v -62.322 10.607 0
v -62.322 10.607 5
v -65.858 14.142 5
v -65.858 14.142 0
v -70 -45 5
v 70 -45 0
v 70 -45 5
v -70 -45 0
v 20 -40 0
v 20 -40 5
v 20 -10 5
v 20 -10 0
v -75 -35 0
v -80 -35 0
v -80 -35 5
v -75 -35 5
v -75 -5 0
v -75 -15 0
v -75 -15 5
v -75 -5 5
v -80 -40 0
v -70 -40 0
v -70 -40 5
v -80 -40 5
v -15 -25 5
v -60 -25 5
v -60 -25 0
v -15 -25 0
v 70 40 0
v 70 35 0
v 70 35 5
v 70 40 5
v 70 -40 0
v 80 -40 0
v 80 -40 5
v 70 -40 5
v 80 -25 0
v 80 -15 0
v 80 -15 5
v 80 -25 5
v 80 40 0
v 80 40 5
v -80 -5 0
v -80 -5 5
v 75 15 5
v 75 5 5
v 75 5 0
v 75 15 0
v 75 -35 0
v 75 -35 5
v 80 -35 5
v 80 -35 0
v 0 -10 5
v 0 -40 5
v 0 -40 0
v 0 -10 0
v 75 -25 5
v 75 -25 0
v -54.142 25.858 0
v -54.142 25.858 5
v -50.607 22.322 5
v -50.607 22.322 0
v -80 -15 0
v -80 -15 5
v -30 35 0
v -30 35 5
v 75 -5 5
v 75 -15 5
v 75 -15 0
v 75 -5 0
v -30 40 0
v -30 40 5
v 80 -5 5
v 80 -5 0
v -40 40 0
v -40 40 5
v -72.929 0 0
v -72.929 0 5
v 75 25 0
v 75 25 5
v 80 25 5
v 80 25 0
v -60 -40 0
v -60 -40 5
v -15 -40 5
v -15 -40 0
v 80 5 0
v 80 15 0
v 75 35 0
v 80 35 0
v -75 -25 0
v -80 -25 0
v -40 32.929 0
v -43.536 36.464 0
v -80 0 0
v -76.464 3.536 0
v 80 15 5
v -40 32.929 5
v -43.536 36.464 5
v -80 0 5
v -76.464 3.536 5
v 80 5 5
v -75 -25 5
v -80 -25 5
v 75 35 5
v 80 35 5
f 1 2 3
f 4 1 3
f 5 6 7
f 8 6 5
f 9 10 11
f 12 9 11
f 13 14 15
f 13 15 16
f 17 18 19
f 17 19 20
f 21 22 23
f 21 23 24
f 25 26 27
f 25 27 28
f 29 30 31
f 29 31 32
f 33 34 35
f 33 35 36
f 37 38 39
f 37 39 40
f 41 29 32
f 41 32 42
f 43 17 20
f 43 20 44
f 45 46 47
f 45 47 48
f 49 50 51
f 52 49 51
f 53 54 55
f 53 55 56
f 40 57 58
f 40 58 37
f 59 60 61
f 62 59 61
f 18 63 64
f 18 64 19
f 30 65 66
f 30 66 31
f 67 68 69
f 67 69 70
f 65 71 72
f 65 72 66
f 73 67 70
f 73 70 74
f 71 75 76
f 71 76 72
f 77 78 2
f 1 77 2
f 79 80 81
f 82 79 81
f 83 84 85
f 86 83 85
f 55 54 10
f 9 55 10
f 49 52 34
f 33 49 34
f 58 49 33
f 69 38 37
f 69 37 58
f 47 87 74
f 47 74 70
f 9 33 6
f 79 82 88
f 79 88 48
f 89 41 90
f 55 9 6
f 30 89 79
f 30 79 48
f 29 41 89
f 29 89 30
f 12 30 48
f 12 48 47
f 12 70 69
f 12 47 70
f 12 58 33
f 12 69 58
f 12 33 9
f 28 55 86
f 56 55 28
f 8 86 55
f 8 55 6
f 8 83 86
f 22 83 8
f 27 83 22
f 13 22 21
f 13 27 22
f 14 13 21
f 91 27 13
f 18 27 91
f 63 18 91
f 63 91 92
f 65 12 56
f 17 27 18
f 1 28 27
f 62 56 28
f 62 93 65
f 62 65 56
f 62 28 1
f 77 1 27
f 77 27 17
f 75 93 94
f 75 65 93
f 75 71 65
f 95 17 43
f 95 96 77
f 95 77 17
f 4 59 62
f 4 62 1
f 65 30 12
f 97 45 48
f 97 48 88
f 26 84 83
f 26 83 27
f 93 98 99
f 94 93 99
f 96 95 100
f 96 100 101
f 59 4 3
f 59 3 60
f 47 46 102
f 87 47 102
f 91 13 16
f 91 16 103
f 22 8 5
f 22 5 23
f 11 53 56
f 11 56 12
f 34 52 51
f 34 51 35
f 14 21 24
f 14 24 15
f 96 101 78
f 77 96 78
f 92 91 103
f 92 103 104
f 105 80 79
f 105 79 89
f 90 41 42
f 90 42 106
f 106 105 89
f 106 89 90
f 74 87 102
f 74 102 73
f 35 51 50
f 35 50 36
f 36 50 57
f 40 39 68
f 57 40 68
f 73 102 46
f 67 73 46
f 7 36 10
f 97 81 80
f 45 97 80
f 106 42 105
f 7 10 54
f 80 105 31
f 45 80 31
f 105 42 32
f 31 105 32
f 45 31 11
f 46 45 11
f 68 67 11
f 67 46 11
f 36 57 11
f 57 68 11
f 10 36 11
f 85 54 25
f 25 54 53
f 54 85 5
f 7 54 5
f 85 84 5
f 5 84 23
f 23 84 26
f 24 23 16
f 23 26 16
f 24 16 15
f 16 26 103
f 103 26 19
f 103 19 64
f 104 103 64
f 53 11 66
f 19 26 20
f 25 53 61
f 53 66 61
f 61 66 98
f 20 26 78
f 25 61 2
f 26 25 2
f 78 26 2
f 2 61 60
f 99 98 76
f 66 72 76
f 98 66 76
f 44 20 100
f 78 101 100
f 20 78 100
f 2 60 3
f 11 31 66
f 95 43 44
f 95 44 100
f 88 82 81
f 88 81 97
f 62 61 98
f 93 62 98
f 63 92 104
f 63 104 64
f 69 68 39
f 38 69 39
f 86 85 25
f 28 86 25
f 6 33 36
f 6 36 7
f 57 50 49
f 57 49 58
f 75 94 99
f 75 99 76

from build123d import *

# Parameters (mm, degrees)
BOSS_EXTRU_1_DEPTH      = 5
ESQUISSE2_W             = 5
ESQUISSE2_H             = 10
ENL_V_MAT_EXTRU_1_DEPTH = 10
ENL_V_MAT_EXTRU_2_DEPTH = 10
ESQUISSE4_W             = 45
ESQUISSE4_H             = 15
ESQUISSE4_W_2           = 20
ESQUISSE4_H_2           = 30
ENL_V_MAT_EXTRU_3_DEPTH = 10


with BuildPart() as part:
    # Esquisse1 → Boss.-Extru.1 (new body)
    with BuildSketch(Plane.XY):
        Polygon((-80, 0), (-40, 40), (-30, 40), (-30, 35), (70, 35), (70, 40), (80, 40), (80, -40), (70, -40), (70, -45), (-70, -45), (-70, -40), (-80, -40), (-80, -35), (-75, -35), (-75, -25), (-80, -25), (-80, -15), (-75, -15), (-75, -5), (-80, -5), align=None)
    extrude(amount=BOSS_EXTRU_1_DEPTH)

    # Esquisse2 → Enlèv. mat.-Extru.1 (cut)
    with BuildSketch(Plane.XY.offset(5)):
        with Locations((77.5, -30)):
            Rectangle(ESQUISSE2_W, ESQUISSE2_H)
        with Locations((77.5, -10)):
            Rectangle(ESQUISSE2_W, ESQUISSE2_H)
        with Locations((77.5, 10)):
            Rectangle(ESQUISSE2_W, ESQUISSE2_H)
        with Locations((77.5, 30)):
            Rectangle(ESQUISSE2_W, ESQUISSE2_H)
    extrude(amount=-ENL_V_MAT_EXTRU_1_DEPTH, mode=Mode.SUBTRACT)

    # Esquisse3 → Enlèv. mat.-Extru.2 (cut)
    with BuildSketch(Plane.XY.offset(5)):
        Polygon((-43.535533906, 36.464466094), (-54.142135624, 25.857864376), (-50.606601718, 22.32233047), (-40, 32.928932188), align=None)
        Polygon((-65.857864376, 14.142135624), (-76.464466094, 3.535533906), (-72.928932188, 0), (-62.32233047, 10.606601718), align=None)
    extrude(amount=-ENL_V_MAT_EXTRU_2_DEPTH, mode=Mode.SUBTRACT)

    # Esquisse4 → Enlèv. mat.-Extru.3 (cut)
    with BuildSketch(Plane.XY.offset(5)):
        with Locations((-37.5, -32.5)):
            Rectangle(ESQUISSE4_W, ESQUISSE4_H)
        with Locations((10, -25)):
            Rectangle(ESQUISSE4_W_2, ESQUISSE4_H_2)
    extrude(amount=-ENL_V_MAT_EXTRU_3_DEPTH, mode=Mode.SUBTRACT)


solid = part.part
